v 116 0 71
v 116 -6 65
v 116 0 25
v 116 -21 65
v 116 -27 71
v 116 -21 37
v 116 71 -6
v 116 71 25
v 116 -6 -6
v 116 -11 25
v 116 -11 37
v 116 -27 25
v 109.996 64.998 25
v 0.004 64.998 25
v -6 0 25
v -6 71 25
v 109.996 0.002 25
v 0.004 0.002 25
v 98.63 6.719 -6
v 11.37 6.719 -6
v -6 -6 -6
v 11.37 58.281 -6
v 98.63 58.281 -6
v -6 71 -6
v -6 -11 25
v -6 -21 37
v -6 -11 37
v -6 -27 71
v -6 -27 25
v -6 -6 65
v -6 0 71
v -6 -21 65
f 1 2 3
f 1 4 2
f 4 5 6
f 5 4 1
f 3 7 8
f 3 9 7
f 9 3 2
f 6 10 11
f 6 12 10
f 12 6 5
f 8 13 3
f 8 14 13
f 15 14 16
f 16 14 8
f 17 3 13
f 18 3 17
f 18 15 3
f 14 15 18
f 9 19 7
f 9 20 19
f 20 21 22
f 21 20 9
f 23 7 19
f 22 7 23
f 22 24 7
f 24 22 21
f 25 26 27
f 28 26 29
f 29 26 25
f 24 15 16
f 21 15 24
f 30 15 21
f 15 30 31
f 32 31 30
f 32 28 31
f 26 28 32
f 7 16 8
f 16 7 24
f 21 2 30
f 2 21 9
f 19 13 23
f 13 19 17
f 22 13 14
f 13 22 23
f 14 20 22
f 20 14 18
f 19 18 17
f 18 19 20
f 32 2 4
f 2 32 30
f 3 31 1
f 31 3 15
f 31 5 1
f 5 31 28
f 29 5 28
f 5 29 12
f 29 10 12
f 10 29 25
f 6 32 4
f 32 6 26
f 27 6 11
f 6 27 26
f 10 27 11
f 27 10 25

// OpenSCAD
// file: soap_dish_pyramid_frustrum.scad
// Function to create a pyramid from two base corners and a height
// Parameters:
// - x1, y1: Coordinates of the first corner of the base
// - x2, y2: Coordinates of the second corner of the base
// - height: Height of the pyramid
module create_pyramid(x1, y1, x2, y2, height) {
    // Calculate the center of the base
    center_x = (x1 + x2) / 2;
    center_y = (y1 + y2) / 2;
    
    // Define the four corners of the base (assuming a rectangle)
    base_points = [
        [x1, y1, 0],  // Bottom-left
        [x2, y1, 0],  // Bottom-right
        [x2, y2, 0],  // Top-right
        [x1, y2, 0]   // Top-left
    ];
    
    // Define the apex point (centered above the base)
    apex = [center_x, center_y, height];
    
    // Create the faces of the pyramid using polyhedron
    polyhedron(
        points = concat(base_points, [apex]),
        faces = [
            [0, 3, 2, 1],  // Base (rectangle)
            [0, 1, 4],      // Side face 1
            [1, 2, 4],      // Side face 2
            [2, 3, 4],      // Side face 3
            [3, 0, 4]       // Side face 4
        ]
    );
}

// Function to create a pyramid frustum from two base corners and heights
// Parameters:
// - x1, y1: Coordinates of the first corner of the base
// - x2, y2: Coordinates of the second corner of the base
// - pyramid_height: Total height of the complete pyramid
// - frustum_height: Height where the pyramid is cut to create the frustum
module create_pyramid_frustum(x1, y1, x2, y2, pyramid_height, frustum_height) {
    // Calculate the center of the base
    center_x = (x1 + x2) / 2;
    center_y = (y1 + y2) / 2;
    
    // Calculate scale factor for the top face
    scale_factor = 1 - (frustum_height / pyramid_height);
    
    // Calculate base dimensions
    base_width = abs(x2 - x1);
    base_depth = abs(y2 - y1);
    
    // Calculate top face dimensions
    top_width = base_width * scale_factor;
    top_depth = base_depth * scale_factor;
    
    // Calculate top face corners
    top_x1 = center_x - (top_width / 2);
    top_y1 = center_y - (top_depth / 2);
    top_x2 = center_x + (top_width / 2);
    top_y2 = center_y + (top_depth / 2);
    
    // Define all points of the frustum
    points = [
        // Bottom face (base) vertices
        [x1, y1, 0],          // 0: Bottom-left
        [x2, y1, 0],          // 1: Bottom-right
        [x2, y2, 0],          // 2: Top-right
        [x1, y2, 0],          // 3: Top-left
        
        // Top face vertices
        [top_x1, top_y1, frustum_height],  // 4: Bottom-left
        [top_x2, top_y1, frustum_height],  // 5: Bottom-right
        [top_x2, top_y2, frustum_height],  // 6: Top-right
        [top_x1, top_y2, frustum_height]   // 7: Top-left
    ];
    
    // Define the faces of the frustum
    faces = [
        [0, 3, 2, 1],  // Bottom face
        [4, 5, 6, 7],  // Top face
        [0, 4, 7, 3],  // Left face
        [1, 5, 4, 0],  // Front face
        [2, 6, 5, 1],  // Right face
        [3, 7, 6, 2]   // Back face
    ];
    
    // Create the frustum
    polyhedron(points = points, faces = faces, convexity = 2);
}

// Modified pyramid frustum function with epsilon adjustments
// to help prevent rendering artifacts
module create_pyramid_frustum_fixed(x1, y1, x2, y2, pyramid_height, frustum_height) {
    // Use a small epsilon value to prevent coincident faces
    eps = 0.01;
    
    // Calculate the center of the base
    center_x = (x1 + x2) / 2;
    center_y = (y1 + y2) / 2;
    
    // Calculate scale factor for the top face
    scale_factor = 1 - (frustum_height / pyramid_height);
    
    // Calculate base dimensions
    base_width = abs(x2 - x1);
    base_depth = abs(y2 - y1);
    
    // Calculate top face dimensions
    top_width = base_width * scale_factor;
    top_depth = base_depth * scale_factor;
    
    // Calculate top face corners with slightly adjusted dimensions
    // to ensure the solid is manifold
    top_x1 = center_x - (top_width / 2) + (frustum_height < 0 ? -eps : eps);
    top_y1 = center_y - (top_depth / 2) + (frustum_height < 0 ? -eps : eps);
    top_x2 = center_x + (top_width / 2) - (frustum_height < 0 ? -eps : eps);
    top_y2 = center_y + (top_depth / 2) - (frustum_height < 0 ? -eps : eps);
    
    // Define all points of the frustum
    points = [
        // Bottom face (base) vertices
        [x1, y1, 0],          // 0: Bottom-left
        [x2, y1, 0],          // 1: Bottom-right
        [x2, y2, 0],          // 2: Top-right
        [x1, y2, 0],          // 3: Top-left
        
        // Top face vertices
        [top_x1, top_y1, frustum_height],  // 4: Bottom-left
        [top_x2, top_y1, frustum_height],  // 5: Bottom-right
        [top_x2, top_y2, frustum_height],  // 6: Top-right
        [top_x1, top_y2, frustum_height]   // 7: Top-left
    ];
    
    // Define the faces of the frustum
    faces = [
        [0, 1, 2, 3],  // Bottom face
        [4, 5, 6, 7],  // Top face
        [0, 4, 7, 3],  // Left face
        [1, 5, 4, 0],  // Front face
        [2, 6, 5, 1],  // Right face
        [3, 7, 6, 2]   // Back face
    ];
    
    // Create the frustum
    polyhedron(points = points, faces = faces, convexity = 10);
}

// Example usage:
//create_pyramid_frustum(-10, -10, 10, 10, -20, -15);

// Example usage:
//create_pyramid(-50, -40, 10, 10, -15);
// main file
include <soap_dish_pyramid_frustrum.scad>

SOAP_WIDTH = 110;
SOAP_DEPTH = 65;
SOAP_HEIGHT = 25;

GLASS_WIDTH = 5;
WALL_SIZE = 6;
EPS = 0.01;
OVERHANG_HEIGHT=40;
OVERHANG_BITE=10;
BACK_OVERHANG_HEIGHT = 40;

// soap dish
//color("white") cube([SOAP_WIDTH, SOAP_DEPTH, SOAP_HEIGHT]);


// bottom soap dish
module basic_dish() {
difference() {
    translate([-WALL_SIZE, -WALL_SIZE, -WALL_SIZE]) {
        cube([SOAP_WIDTH+2*WALL_SIZE, SOAP_DEPTH+2*
        WALL_SIZE, SOAP_HEIGHT+WALL_SIZE]);
    };
//    translate([0, 0, SOAP_HEIGHT + EPS]) {
//        create_pyramid_frustum(0, 0, SOAP_WIDTH, SOAP_DEPTH, -150, -SOAP_HEIGHT - 2*EPS - WALL_SIZE);
//    };
    translate([0, 0, SOAP_HEIGHT + EPS]) {
        create_pyramid(0, 0, SOAP_WIDTH, SOAP_DEPTH, -150);
    };
//    cube([SOAP_WIDTH, SOAP_DEPTH, SOAP_HEIGHT+EPS]);
};
}

module hanger() {

    // wall above back of soap dish
    translate([-WALL_SIZE, -WALL_SIZE, 0])
    cube([SOAP_WIDTH + 2*WALL_SIZE, WALL_SIZE, SOAP_HEIGHT + OVERHANG_HEIGHT]);

    // roof of overhang
    translate([-WALL_SIZE, -2*WALL_SIZE - GLASS_WIDTH - OVERHANG_BITE, SOAP_HEIGHT + OVERHANG_HEIGHT]) {
        cube([SOAP_WIDTH + 2*WALL_SIZE, GLASS_WIDTH + 2*WALL_SIZE + OVERHANG_BITE, WALL_SIZE]);
    };

    // wall on opposite side of glass
    translate([-WALL_SIZE, -2*WALL_SIZE - GLASS_WIDTH - OVERHANG_BITE, SOAP_HEIGHT + OVERHANG_HEIGHT - BACK_OVERHANG_HEIGHT]) {
        cube([SOAP_WIDTH + 2*WALL_SIZE, WALL_SIZE, BACK_OVERHANG_HEIGHT]);
    };

    // section against glass
    translate([-WALL_SIZE, -WALL_SIZE - GLASS_WIDTH - OVERHANG_BITE, SOAP_HEIGHT + OVERHANG_HEIGHT - BACK_OVERHANG_HEIGHT]) {
        cube([SOAP_WIDTH + 2*WALL_SIZE, OVERHANG_BITE, 2*WALL_SIZE]);
    }
}

union() {
    basic_dish();
    hanger();
}

//  color("blue")  translate([0, 0, SOAP_HEIGHT + EPS]) {
//        create_pyramid(0, 0, SOAP_WIDTH, SOAP_DEPTH, -150);
//    };

//translate([0, 0, SOAP_HEIGHT+EPS]) {
//        create_pyramid_frustum(0, 0, SOAP_WIDTH, SOAP_DEPTH, -150, -SOAP_HEIGHT - 2*EPS - WALL_SIZE);
//}
